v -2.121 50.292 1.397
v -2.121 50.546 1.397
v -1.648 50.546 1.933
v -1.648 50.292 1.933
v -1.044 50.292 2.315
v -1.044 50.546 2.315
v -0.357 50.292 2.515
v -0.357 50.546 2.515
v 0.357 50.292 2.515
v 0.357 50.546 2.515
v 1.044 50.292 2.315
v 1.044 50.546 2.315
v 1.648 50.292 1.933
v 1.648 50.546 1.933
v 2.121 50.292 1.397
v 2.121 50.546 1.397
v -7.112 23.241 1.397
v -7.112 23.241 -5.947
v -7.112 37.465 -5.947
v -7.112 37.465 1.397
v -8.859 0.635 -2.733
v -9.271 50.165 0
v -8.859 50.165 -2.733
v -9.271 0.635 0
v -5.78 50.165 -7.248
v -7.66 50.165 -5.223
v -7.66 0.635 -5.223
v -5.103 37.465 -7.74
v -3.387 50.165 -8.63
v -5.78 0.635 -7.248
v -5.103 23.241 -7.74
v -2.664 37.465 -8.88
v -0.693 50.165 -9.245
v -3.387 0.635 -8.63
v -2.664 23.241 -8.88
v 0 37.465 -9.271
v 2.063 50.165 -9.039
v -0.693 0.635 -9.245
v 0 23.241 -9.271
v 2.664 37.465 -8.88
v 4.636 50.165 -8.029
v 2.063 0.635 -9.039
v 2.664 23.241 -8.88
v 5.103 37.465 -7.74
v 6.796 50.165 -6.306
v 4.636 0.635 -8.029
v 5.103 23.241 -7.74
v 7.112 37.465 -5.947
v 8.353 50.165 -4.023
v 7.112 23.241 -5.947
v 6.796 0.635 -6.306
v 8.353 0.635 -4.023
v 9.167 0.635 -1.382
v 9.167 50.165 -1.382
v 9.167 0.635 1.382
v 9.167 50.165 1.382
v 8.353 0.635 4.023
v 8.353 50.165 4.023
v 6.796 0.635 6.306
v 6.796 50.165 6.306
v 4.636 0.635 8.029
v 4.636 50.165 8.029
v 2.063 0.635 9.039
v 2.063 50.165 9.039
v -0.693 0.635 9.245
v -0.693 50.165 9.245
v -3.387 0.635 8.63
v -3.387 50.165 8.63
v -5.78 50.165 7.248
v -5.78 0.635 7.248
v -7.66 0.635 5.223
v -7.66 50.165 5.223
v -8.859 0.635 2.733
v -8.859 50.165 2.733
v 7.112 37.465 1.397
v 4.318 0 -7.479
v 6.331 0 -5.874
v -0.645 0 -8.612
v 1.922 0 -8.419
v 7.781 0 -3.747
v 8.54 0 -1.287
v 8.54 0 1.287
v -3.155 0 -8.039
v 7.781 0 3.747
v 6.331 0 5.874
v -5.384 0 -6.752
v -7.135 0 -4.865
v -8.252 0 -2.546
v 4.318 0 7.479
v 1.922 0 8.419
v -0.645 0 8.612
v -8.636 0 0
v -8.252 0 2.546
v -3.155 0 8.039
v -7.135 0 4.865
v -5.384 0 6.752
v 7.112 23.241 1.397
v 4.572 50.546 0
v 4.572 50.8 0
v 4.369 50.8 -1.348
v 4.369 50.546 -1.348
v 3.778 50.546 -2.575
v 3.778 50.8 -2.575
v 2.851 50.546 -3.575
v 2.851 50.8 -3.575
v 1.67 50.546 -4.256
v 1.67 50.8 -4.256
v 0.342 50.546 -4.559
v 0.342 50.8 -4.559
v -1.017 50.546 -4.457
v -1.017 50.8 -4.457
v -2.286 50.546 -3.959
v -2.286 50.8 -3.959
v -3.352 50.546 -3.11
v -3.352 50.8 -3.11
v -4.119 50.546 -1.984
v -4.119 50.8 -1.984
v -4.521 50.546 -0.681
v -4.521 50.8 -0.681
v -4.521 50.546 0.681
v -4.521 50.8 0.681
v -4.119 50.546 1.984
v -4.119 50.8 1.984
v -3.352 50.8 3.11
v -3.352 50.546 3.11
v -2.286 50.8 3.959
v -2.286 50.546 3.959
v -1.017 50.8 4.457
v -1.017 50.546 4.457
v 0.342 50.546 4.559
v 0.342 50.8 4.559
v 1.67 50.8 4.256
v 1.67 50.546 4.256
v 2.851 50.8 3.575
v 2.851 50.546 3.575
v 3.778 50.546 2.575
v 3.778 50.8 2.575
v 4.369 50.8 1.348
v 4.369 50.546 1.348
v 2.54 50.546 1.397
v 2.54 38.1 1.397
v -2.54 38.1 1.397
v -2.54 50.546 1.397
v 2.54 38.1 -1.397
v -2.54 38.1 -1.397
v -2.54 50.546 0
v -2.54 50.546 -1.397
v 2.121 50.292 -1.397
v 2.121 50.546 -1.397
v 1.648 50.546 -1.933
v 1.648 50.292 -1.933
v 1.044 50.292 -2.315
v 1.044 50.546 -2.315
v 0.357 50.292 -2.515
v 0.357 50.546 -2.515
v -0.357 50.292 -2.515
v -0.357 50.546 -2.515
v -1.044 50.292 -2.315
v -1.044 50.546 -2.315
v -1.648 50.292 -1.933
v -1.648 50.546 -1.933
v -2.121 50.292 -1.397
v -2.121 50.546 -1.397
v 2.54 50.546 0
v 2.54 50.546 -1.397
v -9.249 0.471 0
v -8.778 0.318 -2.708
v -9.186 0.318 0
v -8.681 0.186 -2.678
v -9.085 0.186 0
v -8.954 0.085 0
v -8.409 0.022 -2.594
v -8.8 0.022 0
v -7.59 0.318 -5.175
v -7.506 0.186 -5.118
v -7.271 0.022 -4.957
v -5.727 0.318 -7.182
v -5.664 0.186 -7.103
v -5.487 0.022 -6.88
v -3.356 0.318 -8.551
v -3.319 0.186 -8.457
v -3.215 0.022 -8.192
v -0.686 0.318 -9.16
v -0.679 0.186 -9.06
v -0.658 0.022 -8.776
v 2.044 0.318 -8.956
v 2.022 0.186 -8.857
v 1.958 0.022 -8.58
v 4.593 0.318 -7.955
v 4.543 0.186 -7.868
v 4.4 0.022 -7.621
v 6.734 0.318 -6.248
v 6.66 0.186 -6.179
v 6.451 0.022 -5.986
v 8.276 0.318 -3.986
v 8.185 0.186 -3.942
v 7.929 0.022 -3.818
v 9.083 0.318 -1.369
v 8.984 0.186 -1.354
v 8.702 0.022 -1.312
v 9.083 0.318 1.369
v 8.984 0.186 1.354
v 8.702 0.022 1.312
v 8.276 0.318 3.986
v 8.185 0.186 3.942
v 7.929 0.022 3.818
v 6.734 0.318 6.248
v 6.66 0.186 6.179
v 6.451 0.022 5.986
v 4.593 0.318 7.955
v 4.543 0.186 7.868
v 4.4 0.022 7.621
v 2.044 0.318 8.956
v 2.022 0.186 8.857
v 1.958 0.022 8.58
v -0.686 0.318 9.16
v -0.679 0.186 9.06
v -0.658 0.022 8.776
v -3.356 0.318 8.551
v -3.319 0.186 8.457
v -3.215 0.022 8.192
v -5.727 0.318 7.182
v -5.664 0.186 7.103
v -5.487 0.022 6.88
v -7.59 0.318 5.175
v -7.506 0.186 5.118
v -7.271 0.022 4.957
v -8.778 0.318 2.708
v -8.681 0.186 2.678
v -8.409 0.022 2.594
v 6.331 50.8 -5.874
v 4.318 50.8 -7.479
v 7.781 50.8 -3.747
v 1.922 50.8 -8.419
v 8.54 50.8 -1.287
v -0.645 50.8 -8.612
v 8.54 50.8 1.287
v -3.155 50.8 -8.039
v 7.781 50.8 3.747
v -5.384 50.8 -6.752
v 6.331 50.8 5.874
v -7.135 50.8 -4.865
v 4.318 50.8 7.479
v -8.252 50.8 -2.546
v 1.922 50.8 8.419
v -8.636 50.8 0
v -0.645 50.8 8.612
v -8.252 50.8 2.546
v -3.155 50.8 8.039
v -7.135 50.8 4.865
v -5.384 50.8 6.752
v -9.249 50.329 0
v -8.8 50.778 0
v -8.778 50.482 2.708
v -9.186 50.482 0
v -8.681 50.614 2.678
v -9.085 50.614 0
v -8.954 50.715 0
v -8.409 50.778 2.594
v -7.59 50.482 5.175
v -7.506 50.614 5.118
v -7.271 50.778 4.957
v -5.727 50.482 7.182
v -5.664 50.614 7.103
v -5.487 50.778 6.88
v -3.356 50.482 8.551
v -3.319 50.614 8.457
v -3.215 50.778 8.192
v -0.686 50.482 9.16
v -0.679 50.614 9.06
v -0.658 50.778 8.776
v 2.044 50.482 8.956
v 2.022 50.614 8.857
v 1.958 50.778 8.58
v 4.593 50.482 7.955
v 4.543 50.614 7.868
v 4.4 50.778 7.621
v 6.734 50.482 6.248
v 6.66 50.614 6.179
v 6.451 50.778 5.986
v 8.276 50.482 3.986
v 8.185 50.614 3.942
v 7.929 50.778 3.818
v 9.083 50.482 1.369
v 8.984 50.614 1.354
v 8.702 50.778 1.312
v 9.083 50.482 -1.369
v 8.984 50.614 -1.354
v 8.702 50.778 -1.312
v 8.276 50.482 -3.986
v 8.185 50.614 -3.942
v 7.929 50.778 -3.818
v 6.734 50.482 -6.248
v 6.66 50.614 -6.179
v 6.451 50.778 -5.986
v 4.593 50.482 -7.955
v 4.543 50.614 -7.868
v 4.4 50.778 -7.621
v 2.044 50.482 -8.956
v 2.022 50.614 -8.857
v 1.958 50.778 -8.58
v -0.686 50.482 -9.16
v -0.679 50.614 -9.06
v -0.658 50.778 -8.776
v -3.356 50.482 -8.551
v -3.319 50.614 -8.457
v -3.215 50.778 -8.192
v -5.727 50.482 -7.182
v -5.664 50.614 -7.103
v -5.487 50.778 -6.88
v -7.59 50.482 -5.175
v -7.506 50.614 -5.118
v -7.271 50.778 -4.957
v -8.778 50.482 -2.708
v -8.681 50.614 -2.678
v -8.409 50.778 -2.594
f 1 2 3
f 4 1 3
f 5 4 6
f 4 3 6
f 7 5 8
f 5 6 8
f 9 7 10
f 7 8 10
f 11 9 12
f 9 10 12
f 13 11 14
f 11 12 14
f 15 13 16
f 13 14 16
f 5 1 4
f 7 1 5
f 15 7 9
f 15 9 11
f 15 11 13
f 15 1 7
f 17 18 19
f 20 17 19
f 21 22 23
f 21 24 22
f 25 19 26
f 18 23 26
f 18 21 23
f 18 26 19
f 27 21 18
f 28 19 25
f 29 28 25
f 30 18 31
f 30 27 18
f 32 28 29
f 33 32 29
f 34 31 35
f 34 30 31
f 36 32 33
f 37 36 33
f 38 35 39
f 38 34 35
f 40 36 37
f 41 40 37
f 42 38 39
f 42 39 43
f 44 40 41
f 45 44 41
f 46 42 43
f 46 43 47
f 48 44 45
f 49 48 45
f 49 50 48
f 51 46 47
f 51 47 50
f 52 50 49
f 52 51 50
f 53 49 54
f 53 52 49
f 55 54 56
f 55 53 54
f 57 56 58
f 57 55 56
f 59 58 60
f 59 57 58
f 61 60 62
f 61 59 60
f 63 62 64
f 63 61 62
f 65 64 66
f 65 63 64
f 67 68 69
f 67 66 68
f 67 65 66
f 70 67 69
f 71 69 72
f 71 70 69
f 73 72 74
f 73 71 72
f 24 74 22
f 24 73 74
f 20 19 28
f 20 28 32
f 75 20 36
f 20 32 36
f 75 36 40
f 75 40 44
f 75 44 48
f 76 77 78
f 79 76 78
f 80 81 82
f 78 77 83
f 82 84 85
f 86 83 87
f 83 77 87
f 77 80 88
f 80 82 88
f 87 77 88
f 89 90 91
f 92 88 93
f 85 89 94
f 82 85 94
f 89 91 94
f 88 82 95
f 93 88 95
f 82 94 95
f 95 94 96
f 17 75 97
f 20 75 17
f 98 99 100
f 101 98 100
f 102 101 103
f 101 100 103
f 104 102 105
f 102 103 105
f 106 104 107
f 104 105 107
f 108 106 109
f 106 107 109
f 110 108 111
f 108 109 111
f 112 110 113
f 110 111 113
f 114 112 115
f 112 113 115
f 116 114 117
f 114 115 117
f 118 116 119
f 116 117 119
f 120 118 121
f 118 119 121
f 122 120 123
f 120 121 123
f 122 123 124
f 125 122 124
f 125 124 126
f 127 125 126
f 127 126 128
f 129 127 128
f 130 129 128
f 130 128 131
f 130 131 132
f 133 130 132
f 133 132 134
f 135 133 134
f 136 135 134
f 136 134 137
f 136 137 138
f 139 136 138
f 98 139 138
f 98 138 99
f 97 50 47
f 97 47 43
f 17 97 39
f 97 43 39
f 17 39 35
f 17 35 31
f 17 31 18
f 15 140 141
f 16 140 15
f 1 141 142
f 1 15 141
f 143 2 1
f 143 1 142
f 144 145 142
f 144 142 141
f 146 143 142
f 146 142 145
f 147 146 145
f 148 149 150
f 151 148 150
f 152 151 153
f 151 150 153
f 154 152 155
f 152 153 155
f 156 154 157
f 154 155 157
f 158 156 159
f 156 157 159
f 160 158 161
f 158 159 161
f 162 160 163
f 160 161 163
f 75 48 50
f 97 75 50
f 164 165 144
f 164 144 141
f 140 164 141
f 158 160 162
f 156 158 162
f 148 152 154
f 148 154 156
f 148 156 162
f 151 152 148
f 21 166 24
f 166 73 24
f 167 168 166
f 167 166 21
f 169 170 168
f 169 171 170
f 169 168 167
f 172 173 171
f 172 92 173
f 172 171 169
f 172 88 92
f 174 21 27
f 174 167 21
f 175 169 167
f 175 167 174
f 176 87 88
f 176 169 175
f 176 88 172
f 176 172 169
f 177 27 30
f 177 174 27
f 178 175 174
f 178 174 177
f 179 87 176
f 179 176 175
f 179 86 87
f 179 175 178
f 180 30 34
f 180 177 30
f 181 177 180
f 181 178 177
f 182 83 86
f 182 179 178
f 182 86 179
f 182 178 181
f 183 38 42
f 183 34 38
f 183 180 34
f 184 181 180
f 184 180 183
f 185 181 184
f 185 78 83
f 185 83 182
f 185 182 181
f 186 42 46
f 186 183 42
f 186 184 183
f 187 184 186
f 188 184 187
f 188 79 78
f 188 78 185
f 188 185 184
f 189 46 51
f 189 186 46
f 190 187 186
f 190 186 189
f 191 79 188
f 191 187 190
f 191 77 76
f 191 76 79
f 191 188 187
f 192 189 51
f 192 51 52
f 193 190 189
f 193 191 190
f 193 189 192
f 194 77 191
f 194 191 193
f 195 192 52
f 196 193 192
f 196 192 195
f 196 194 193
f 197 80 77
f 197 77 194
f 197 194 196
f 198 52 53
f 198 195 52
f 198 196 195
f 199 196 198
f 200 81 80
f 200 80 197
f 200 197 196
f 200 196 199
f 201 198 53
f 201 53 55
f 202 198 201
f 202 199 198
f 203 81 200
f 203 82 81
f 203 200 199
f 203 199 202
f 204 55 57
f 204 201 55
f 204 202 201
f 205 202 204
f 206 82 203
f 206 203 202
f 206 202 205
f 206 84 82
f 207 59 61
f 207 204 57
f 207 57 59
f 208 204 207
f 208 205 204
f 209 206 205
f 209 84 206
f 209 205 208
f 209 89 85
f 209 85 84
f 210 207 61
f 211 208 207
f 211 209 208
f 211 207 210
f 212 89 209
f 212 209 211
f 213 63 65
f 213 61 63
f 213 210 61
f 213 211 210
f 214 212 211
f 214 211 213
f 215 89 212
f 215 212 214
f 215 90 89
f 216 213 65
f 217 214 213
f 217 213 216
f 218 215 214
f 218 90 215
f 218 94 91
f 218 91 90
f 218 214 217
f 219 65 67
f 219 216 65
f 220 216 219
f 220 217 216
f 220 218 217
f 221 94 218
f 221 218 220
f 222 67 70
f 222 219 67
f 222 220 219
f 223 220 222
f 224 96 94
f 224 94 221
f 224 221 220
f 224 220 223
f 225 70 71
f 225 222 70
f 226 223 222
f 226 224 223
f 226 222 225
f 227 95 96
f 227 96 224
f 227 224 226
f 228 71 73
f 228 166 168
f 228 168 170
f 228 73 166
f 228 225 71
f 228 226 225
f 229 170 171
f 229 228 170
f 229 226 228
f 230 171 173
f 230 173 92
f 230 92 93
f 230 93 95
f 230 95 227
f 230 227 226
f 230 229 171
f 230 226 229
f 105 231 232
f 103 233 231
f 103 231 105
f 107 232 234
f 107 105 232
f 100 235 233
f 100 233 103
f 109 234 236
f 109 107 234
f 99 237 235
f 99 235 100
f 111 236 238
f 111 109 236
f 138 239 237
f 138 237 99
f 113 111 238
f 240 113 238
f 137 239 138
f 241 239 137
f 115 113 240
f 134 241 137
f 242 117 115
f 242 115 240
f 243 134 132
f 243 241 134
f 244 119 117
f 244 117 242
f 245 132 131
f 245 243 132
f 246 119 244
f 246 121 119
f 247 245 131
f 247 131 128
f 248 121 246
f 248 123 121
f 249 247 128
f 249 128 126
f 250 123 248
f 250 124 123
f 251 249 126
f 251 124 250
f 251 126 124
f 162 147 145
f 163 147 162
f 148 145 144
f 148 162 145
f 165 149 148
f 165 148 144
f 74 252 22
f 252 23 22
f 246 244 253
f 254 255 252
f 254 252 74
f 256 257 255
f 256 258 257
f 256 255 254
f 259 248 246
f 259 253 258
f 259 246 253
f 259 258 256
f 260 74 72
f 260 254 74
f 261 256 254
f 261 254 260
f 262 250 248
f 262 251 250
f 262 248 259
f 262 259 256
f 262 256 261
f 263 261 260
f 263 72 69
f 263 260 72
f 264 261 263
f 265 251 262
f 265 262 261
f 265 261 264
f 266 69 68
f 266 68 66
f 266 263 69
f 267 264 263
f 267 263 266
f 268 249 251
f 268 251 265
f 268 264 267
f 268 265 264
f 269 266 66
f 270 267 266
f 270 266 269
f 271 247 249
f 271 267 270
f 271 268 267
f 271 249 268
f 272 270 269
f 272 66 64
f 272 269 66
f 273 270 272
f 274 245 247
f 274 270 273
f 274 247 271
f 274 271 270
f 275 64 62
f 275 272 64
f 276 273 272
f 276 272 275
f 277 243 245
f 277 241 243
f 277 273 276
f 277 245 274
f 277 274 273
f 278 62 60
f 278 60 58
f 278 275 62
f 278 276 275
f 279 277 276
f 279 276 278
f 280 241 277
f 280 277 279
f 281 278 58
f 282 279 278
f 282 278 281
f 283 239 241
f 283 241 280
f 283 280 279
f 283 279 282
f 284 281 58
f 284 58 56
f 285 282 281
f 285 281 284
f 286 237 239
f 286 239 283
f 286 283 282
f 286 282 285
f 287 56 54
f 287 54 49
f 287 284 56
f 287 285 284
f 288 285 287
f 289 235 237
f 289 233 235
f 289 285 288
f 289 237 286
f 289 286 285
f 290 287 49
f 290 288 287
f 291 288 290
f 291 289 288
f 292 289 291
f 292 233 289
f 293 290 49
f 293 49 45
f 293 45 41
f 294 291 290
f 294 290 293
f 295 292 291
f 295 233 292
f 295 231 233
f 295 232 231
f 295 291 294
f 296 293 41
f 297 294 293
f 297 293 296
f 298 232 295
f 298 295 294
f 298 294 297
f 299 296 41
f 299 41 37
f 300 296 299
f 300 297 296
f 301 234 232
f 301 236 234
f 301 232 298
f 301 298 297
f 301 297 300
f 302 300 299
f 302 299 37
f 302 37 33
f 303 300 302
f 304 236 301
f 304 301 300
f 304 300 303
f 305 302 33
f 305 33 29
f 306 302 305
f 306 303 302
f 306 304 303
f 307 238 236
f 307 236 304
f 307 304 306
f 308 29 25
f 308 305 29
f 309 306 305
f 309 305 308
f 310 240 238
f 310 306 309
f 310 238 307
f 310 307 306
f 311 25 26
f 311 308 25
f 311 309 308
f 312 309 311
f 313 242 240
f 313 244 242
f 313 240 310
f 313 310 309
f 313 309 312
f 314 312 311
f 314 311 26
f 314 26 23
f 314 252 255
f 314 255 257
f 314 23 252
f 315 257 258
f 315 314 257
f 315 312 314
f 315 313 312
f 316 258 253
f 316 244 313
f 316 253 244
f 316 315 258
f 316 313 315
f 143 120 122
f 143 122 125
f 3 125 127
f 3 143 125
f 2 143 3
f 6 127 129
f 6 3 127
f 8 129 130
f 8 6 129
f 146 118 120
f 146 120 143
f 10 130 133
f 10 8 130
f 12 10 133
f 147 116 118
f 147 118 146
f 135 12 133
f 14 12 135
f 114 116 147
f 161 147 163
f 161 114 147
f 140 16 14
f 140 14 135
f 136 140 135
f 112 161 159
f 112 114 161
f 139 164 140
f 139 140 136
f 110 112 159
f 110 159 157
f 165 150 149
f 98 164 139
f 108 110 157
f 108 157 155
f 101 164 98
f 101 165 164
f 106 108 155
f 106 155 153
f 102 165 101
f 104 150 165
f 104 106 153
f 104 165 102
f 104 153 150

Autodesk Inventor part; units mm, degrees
ref_plane "YZ Plane" through (0, 0, 0) normal (1, 0, 0) x (0, 1, 0)
ref_plane "XZ Plane" through (0, 0, 0) normal (0, 1, 0) x (-1, 0, 0)
ref_plane "XY Plane" through (0, 0, 0) normal (0, 0, 1) x (1, 0, 0)
sketch "Sketch1" plane through (0, 0, 0) normal (0, 1, 0) x (-1, 0, 0)
  circle A0 centre (0, 0) radius 9.271
  dimension "d0" = 18.542
extrude "Extrusion1" add sketch "Sketch1" along normal blind 50.8
sketch "Sketch2" plane through (0, 50.8, 0) normal (0, 1, 0) x (1, 0, 0)
  line L0 (-2.54, 1.397) -> (2.54, 1.397)
  line L1 (2.54, 1.397) -> (2.54, -1.397)
  line L2 (2.54, -1.397) -> (-2.54, -1.397)
  line L3 (-2.54, -1.397) -> (-2.54, 1.397)
  line L4 (-2.54, 1.397) -> (2.54, -1.397) construction
  line L5 (2.54, 1.397) -> (-2.54, -1.397) construction
  point P0 (0, 0)
  point P1 (2.54, 0)
  point P2 (-2.54, 0)
  dimension "d3" = 2.794
  dimension "d4" = 5.08
extrude "Extrusion2" cut sketch "Sketch2" against normal blind 12.7
fillet "Fillet2" radius 0.635 2 edges at (9.271, 50.8, 0) (9.271, 0, 0)
sketch "Sketch3" plane through (2.54, 38.1, 1.397) normal (0, 0, -1) x (-1, 0, 0)
  line L0 (9.652, -0.635) -> (-4.572, -0.635)
  line L1 (-4.572, -0.635) -> (-4.572, -14.859)
  line L2 (-4.572, -14.859) -> (9.652, -14.859)
  line L3 (9.652, -14.859) -> (9.652, -0.635)
  line L4 (9.652, -0.635) -> (-4.572, -14.859) construction
  line L5 (-4.572, -0.635) -> (9.652, -14.859) construction
  line L6 (11.811, 12.065) -> (-6.731, 12.065) projected
  point P0 (2.54, -38.1)
  point P1 (2.54, -7.747)
  dimension "d9" = 14.224
  dimension "d10" = 14.224
  dimension "d11" = 12.7
extrude "Extrusion3" add sketch "Sketch3" along normal blind 127
sketch "Sketch4" plane through (2.54, 38.1, -125.603) normal (0, 0, -1) x (-1, 0, 0)
  line L0 (9.652, -0.635) -> (-4.572, -0.635) projected
  line L1 (-4.572, -14.859) -> (9.652, -14.859) projected
  line L2 (9.652, -0.635) -> (-4.572, -0.635)
  line L3 (-4.572, -0.635) -> (-4.572, -14.859)
  line L4 (-4.572, -14.859) -> (9.652, -14.859)
  line L5 (9.652, -14.859) -> (9.652, -0.635)
  point P0 (2.54, -38.1)
  point P1 (-4.572, -0.635)
extrude "Extrusion4" cut sketch "Sketch4" against normal blind 127
sketch "Sketch5" plane through (0, 50.8, 0) normal (0, 1, 0) x (1, 0, 0)
  circle A0 centre (0, 0) radius 2.54
  dimension "d16" = 5.08
extrude "Extrusion5" cut sketch "Sketch5" against normal blind 0.508
sketch "Sketch6" plane through (0, 50.8, 0) normal (0, 1, 0) x (1, 0, 0)
  arc A0 (-2.1213, -1.397) -> (2.1213, -1.397) centre (0, 0) ccw projected
  circle A1 centre (0, 0) radius 4.572
  dimension "d19" = 9.144
extrude "Extrusion6" cut sketch "Sketch6" against normal blind 0.254
properties part number "spinny"
